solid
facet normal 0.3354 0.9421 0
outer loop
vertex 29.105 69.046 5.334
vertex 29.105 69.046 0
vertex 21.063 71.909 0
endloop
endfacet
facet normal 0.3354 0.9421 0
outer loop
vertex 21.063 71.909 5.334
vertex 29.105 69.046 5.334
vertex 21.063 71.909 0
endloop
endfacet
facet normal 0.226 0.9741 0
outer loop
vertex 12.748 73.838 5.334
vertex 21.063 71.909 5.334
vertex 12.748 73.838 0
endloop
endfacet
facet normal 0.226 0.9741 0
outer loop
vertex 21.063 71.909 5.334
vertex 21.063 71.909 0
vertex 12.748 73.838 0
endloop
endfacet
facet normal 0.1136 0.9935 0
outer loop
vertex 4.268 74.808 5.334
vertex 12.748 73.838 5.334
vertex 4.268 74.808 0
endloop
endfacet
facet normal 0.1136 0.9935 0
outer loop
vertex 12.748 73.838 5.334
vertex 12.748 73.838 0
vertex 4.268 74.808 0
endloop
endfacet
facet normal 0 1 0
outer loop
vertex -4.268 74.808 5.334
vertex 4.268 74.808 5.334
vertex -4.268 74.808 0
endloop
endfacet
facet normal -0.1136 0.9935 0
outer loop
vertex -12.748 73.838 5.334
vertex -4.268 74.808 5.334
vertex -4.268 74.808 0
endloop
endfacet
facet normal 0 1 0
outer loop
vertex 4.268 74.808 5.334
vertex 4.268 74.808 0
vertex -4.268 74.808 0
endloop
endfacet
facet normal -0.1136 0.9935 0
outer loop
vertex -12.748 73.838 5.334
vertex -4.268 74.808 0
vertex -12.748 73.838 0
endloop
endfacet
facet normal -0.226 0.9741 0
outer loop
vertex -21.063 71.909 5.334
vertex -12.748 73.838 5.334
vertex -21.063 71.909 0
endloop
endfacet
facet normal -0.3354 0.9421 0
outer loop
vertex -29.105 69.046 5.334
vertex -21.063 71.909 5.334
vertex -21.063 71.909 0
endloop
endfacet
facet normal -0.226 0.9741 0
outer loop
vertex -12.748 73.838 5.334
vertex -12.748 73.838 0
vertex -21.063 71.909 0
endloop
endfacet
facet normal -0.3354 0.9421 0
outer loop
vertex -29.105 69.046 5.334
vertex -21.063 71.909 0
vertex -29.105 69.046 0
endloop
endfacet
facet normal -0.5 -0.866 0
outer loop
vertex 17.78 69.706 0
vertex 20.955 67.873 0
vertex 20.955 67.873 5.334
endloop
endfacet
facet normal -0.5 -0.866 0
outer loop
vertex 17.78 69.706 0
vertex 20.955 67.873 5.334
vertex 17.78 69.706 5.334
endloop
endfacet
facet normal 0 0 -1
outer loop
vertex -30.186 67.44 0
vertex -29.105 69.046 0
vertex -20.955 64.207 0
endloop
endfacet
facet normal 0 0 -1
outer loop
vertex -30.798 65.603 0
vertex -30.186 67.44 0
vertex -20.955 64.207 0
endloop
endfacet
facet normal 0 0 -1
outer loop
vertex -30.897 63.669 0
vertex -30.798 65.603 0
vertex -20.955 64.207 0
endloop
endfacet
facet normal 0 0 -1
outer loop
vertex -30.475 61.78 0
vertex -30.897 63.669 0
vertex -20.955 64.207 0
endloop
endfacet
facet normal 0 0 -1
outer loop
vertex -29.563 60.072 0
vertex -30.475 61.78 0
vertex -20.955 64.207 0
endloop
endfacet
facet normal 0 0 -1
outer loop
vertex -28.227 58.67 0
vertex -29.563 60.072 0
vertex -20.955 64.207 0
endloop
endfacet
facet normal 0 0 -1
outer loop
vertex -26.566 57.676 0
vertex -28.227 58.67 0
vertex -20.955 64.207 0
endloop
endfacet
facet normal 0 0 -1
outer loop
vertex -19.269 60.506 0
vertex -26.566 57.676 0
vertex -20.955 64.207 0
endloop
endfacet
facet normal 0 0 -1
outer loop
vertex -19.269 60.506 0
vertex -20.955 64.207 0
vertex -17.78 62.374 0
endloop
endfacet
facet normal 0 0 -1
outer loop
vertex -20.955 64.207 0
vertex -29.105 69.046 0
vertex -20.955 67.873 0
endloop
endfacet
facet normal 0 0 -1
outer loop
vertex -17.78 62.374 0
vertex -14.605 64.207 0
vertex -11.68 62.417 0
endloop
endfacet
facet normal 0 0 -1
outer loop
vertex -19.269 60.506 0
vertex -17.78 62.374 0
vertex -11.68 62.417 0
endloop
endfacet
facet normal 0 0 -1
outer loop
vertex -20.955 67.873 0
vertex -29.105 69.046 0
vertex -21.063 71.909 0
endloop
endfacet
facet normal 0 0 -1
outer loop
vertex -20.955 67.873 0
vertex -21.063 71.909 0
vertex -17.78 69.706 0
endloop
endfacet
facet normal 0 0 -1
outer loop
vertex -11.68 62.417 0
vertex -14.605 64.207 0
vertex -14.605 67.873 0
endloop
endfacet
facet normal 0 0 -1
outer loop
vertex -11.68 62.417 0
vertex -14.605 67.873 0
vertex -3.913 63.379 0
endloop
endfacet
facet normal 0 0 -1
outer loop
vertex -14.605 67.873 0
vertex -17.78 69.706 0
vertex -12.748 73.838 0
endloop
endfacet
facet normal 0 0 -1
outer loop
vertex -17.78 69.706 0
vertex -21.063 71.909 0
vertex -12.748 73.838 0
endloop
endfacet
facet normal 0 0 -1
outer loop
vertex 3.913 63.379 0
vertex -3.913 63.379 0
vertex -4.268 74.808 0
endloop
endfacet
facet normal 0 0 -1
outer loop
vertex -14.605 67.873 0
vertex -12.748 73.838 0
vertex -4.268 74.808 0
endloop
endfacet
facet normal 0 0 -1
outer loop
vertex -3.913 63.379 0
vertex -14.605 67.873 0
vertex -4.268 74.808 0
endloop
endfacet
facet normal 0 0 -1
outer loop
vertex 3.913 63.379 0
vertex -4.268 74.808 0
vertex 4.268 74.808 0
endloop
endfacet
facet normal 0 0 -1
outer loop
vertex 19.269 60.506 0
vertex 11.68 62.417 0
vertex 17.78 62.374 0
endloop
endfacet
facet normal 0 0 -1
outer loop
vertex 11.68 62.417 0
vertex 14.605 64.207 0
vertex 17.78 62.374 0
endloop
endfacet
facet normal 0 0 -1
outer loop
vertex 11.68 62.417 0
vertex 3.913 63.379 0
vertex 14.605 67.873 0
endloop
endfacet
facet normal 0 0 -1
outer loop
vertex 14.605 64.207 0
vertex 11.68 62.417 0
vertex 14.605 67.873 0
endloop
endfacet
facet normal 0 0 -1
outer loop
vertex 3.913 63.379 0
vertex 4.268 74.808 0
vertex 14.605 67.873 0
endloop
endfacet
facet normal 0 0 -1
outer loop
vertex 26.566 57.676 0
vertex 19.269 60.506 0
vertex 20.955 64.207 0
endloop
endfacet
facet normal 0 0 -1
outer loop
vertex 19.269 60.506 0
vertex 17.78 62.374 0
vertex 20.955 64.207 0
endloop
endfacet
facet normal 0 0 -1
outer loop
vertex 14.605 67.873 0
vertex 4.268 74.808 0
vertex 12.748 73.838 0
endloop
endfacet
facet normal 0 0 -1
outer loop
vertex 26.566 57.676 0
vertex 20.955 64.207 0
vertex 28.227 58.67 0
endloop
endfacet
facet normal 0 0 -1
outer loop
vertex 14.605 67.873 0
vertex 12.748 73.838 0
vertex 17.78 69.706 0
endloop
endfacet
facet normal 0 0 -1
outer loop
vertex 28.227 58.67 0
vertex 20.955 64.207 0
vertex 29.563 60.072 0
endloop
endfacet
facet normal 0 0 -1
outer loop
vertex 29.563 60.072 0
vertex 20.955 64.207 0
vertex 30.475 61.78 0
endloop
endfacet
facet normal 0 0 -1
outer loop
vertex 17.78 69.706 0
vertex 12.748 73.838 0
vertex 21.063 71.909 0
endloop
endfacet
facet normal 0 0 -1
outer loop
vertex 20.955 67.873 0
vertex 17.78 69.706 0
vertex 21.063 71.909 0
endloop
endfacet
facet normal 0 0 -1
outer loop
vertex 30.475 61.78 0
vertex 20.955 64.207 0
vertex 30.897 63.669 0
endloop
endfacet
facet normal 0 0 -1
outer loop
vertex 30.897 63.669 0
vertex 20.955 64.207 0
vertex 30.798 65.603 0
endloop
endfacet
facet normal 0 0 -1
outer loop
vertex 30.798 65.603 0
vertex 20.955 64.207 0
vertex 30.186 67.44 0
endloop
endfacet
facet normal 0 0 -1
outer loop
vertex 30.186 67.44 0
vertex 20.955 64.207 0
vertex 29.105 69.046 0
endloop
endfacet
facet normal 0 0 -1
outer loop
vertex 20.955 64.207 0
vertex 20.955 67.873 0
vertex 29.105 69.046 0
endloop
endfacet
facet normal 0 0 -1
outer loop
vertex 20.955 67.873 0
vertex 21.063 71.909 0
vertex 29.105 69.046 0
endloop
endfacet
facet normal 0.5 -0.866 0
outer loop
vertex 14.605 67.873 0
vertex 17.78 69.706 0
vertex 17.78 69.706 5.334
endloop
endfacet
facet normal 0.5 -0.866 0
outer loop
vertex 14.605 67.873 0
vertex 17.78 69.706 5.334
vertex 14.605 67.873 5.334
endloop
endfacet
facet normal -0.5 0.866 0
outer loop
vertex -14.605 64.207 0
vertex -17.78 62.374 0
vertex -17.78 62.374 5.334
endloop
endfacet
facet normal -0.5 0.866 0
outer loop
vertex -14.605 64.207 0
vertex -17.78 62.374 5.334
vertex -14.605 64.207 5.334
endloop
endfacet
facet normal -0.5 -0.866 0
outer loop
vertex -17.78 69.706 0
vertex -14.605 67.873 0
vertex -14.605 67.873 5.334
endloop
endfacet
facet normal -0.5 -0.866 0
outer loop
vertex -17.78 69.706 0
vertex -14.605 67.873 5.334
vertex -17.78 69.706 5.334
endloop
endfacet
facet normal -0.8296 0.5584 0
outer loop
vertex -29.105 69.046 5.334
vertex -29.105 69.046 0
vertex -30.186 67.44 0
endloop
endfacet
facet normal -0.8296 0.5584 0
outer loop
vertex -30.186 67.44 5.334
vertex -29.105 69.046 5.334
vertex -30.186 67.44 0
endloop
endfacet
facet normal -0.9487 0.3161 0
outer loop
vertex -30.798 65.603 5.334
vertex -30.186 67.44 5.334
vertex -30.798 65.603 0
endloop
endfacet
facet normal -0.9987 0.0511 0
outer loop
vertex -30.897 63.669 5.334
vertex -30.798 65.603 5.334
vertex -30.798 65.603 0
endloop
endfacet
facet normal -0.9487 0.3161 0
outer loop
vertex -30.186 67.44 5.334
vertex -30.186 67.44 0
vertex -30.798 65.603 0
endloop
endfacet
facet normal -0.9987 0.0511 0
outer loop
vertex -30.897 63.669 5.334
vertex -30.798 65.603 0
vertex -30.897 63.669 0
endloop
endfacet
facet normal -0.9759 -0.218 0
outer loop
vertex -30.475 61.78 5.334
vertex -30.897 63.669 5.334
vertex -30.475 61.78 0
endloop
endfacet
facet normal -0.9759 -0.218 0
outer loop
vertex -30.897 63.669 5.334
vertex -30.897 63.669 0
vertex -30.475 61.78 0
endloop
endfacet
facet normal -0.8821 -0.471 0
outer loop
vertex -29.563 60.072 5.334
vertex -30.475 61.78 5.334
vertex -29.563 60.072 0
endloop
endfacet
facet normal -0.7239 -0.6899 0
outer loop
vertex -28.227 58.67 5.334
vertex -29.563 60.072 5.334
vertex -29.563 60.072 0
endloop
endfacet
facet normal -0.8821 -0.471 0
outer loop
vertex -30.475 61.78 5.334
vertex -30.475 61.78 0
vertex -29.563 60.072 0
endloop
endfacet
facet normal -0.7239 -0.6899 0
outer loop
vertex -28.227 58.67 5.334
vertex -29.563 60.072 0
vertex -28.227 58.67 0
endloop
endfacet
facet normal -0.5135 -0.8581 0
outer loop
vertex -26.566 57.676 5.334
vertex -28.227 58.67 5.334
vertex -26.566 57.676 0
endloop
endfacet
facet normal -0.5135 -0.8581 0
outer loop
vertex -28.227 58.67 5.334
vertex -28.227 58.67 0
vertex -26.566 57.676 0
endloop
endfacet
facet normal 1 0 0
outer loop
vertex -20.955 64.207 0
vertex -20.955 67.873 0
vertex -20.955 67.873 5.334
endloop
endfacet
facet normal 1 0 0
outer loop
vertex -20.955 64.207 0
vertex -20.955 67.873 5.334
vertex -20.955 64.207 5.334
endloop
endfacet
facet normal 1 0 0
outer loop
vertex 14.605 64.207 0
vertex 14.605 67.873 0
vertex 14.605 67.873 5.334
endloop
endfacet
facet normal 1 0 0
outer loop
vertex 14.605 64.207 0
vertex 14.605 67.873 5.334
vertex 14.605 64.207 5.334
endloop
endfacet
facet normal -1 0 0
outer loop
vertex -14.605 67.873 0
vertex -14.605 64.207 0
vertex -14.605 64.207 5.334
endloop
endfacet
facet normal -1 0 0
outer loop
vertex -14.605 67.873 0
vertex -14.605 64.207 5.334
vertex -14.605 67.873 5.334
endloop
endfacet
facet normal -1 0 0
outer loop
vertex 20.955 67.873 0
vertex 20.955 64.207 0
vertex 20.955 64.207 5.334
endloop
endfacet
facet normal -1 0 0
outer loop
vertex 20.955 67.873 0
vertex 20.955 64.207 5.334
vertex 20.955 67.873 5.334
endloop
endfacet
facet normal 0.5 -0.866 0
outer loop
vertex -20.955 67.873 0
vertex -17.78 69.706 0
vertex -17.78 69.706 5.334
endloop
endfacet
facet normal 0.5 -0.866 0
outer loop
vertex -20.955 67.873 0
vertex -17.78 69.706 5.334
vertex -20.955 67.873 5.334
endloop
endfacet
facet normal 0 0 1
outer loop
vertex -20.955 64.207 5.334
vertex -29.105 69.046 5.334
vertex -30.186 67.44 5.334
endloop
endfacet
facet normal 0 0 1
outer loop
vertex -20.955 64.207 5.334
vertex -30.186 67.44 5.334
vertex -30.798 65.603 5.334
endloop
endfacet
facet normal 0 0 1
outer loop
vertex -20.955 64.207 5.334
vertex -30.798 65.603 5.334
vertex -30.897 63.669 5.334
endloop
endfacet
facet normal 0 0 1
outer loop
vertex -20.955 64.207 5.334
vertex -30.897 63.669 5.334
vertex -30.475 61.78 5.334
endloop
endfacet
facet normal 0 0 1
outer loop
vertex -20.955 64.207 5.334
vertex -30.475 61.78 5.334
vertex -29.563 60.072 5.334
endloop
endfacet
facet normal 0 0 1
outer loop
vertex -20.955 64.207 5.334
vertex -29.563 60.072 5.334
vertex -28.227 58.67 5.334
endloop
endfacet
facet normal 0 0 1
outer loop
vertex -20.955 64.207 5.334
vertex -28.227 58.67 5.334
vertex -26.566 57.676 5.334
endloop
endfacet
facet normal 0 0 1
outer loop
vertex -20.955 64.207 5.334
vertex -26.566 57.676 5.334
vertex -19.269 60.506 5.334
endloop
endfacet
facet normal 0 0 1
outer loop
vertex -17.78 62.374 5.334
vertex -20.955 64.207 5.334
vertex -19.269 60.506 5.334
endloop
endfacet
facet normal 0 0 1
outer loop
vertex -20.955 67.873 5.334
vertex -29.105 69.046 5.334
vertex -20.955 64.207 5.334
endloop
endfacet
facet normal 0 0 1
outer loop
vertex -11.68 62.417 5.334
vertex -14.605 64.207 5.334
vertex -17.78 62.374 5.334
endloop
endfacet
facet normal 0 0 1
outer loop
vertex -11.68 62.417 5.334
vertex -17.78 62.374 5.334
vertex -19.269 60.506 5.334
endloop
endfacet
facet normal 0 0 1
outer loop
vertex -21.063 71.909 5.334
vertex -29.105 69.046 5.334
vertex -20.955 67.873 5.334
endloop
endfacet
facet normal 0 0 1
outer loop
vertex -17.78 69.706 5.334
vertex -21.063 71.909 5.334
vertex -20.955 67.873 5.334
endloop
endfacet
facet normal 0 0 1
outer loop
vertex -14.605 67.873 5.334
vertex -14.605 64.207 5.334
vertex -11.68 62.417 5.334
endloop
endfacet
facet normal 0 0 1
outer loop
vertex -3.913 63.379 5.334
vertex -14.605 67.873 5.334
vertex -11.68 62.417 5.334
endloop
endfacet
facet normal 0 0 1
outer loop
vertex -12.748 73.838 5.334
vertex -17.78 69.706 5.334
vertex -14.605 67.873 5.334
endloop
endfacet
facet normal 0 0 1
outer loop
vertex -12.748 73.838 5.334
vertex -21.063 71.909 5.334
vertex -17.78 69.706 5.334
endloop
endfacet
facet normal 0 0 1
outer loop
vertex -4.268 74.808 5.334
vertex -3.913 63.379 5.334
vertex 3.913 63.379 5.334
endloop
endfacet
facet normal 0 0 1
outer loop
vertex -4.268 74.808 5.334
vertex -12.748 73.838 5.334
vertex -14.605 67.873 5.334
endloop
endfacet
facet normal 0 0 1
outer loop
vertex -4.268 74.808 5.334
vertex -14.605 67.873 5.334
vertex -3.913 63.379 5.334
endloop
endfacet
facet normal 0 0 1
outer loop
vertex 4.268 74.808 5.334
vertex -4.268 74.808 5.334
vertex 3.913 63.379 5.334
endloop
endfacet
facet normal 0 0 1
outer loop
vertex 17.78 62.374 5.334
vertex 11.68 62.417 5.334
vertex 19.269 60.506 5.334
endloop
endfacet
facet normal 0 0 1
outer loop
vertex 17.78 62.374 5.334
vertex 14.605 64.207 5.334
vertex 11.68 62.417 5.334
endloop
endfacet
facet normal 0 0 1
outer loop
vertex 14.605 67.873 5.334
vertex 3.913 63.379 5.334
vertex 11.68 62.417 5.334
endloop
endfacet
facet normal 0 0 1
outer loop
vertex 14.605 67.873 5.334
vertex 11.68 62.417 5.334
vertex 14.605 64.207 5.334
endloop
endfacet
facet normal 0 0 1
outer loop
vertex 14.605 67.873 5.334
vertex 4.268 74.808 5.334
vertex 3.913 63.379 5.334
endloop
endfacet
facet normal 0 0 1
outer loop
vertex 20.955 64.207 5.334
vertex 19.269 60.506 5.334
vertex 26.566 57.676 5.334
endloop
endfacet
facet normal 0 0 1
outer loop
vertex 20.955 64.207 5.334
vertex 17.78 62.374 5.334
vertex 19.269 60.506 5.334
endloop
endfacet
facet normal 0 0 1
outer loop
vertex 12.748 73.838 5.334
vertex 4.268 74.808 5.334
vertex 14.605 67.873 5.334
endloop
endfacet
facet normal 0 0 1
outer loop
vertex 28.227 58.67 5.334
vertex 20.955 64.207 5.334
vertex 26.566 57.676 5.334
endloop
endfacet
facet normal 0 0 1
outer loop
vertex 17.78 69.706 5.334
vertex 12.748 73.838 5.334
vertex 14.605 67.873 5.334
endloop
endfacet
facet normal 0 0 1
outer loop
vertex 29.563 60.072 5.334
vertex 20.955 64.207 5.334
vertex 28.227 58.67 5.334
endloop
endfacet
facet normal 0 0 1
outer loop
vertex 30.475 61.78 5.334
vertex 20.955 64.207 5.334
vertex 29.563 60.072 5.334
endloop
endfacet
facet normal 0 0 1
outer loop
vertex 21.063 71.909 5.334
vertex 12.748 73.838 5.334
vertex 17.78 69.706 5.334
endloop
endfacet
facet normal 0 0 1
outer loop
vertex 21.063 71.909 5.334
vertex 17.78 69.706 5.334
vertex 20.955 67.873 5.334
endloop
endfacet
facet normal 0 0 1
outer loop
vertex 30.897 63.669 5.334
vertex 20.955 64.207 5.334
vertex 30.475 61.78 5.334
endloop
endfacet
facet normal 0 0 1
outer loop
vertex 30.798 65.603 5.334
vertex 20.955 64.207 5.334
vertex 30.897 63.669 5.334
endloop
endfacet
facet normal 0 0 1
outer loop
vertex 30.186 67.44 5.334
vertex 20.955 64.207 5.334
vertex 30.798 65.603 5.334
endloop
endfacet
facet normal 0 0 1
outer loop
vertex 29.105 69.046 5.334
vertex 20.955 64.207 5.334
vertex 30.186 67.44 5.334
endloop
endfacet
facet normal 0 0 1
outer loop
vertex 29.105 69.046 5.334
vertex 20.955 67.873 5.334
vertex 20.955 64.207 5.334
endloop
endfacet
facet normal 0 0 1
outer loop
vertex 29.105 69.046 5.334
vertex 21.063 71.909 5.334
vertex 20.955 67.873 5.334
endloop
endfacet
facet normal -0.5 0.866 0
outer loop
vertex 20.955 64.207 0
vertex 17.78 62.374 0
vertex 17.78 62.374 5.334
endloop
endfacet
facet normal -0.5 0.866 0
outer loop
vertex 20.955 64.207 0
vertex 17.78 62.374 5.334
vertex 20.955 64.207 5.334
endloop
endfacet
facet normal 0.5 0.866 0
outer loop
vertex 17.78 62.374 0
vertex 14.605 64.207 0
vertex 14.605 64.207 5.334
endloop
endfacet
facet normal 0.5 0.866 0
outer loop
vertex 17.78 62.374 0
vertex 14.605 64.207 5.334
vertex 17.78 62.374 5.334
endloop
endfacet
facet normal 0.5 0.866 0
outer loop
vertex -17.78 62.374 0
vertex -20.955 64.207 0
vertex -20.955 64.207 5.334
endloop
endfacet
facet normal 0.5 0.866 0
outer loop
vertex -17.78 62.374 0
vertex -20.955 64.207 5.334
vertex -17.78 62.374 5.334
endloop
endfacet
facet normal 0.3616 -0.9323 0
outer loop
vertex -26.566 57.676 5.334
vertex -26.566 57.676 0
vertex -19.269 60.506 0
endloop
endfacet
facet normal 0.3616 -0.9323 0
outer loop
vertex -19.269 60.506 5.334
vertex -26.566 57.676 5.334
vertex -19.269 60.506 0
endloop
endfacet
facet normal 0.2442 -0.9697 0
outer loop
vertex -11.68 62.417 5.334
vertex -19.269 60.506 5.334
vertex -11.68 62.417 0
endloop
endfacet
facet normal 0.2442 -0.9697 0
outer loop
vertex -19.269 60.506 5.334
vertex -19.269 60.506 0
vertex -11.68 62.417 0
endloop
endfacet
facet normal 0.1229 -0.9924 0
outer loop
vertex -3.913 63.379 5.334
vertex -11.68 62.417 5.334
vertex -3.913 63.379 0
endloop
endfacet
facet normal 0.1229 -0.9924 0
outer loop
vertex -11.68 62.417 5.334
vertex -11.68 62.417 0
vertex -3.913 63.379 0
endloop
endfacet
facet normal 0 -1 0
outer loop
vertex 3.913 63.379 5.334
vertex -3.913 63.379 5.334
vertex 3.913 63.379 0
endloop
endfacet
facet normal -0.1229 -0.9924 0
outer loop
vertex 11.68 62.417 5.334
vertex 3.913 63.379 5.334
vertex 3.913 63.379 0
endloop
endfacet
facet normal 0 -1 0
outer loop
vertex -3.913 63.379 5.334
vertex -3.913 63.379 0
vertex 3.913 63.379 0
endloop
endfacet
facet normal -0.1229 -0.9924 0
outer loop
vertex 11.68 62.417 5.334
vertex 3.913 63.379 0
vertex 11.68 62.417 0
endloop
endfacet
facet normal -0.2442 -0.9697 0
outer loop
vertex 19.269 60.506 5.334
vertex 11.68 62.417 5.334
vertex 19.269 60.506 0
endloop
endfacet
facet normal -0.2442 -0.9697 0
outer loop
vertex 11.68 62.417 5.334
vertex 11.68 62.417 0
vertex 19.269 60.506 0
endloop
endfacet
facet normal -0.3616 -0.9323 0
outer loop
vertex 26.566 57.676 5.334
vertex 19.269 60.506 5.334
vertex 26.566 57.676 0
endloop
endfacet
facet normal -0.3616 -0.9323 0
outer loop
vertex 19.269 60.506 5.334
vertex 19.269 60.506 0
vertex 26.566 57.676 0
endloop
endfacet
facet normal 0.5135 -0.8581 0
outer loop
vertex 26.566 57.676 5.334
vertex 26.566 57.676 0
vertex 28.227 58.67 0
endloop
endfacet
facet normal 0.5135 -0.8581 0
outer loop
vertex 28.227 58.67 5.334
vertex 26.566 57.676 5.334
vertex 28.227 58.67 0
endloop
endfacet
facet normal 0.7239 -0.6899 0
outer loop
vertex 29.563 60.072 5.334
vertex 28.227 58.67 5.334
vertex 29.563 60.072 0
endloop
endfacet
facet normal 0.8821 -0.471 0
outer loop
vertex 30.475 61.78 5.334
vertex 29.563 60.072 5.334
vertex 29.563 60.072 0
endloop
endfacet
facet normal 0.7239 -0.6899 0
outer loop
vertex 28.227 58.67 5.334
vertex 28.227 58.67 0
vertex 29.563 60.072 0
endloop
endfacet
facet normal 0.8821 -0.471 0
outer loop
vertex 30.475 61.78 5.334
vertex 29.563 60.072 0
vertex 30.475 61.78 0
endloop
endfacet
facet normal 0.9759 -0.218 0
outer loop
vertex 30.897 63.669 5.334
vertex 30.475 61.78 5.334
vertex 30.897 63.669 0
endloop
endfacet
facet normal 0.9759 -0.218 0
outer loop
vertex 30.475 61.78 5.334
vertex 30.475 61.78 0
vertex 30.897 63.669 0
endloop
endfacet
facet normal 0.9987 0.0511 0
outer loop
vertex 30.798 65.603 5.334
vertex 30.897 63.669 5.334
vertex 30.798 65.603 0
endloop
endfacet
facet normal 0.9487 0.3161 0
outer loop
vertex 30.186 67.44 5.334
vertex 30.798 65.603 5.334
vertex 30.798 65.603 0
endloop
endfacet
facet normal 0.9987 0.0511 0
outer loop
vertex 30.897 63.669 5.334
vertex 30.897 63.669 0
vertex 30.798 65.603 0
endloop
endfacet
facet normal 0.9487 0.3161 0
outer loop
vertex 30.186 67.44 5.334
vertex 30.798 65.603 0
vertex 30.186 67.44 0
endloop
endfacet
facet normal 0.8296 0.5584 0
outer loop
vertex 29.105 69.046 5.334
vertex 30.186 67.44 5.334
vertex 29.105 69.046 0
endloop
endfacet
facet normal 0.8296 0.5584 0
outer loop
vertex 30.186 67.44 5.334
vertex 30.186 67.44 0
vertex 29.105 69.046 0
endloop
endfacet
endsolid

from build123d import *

# Parameters (mm, degrees)
BOSS_EXTRUDE1_DEPTH = 5.334


with BuildPart() as part:
    # Sketch1 → Boss-Extrude1 (new body)
    with BuildSketch(Plane.XY):
        with BuildLine():
            ThreePointArc((29.104915692, 69.046424835), (0, 74.93), (-29.104915692, 69.046424835))
            ThreePointArc((-29.104915692, 69.046424835), (-30.750210185, 62.710204346), (-26.565512441, 57.676022304))
            ThreePointArc((-26.565512441, 57.676022304), (0, 63.5), (26.565512441, 57.676022304))
            ThreePointArc((26.565512441, 57.676022304), (30.750210185, 62.710204346), (29.104915692, 69.046424835))
        make_face()
        Polygon((-17.78, 62.373825791), (-14.605, 64.206912895), (-14.605, 67.873087105), (-17.78, 69.706174209), (-20.955, 67.873087105), (-20.955, 64.206912895), align=None, mode=Mode.SUBTRACT)
        Polygon((17.78, 62.373825791), (20.955, 64.206912895), (20.955, 67.873087105), (17.78, 69.706174209), (14.605, 67.873087105), (14.605, 64.206912895), align=None, mode=Mode.SUBTRACT)
    extrude(amount=BOSS_EXTRUDE1_DEPTH)


solid = part.part
